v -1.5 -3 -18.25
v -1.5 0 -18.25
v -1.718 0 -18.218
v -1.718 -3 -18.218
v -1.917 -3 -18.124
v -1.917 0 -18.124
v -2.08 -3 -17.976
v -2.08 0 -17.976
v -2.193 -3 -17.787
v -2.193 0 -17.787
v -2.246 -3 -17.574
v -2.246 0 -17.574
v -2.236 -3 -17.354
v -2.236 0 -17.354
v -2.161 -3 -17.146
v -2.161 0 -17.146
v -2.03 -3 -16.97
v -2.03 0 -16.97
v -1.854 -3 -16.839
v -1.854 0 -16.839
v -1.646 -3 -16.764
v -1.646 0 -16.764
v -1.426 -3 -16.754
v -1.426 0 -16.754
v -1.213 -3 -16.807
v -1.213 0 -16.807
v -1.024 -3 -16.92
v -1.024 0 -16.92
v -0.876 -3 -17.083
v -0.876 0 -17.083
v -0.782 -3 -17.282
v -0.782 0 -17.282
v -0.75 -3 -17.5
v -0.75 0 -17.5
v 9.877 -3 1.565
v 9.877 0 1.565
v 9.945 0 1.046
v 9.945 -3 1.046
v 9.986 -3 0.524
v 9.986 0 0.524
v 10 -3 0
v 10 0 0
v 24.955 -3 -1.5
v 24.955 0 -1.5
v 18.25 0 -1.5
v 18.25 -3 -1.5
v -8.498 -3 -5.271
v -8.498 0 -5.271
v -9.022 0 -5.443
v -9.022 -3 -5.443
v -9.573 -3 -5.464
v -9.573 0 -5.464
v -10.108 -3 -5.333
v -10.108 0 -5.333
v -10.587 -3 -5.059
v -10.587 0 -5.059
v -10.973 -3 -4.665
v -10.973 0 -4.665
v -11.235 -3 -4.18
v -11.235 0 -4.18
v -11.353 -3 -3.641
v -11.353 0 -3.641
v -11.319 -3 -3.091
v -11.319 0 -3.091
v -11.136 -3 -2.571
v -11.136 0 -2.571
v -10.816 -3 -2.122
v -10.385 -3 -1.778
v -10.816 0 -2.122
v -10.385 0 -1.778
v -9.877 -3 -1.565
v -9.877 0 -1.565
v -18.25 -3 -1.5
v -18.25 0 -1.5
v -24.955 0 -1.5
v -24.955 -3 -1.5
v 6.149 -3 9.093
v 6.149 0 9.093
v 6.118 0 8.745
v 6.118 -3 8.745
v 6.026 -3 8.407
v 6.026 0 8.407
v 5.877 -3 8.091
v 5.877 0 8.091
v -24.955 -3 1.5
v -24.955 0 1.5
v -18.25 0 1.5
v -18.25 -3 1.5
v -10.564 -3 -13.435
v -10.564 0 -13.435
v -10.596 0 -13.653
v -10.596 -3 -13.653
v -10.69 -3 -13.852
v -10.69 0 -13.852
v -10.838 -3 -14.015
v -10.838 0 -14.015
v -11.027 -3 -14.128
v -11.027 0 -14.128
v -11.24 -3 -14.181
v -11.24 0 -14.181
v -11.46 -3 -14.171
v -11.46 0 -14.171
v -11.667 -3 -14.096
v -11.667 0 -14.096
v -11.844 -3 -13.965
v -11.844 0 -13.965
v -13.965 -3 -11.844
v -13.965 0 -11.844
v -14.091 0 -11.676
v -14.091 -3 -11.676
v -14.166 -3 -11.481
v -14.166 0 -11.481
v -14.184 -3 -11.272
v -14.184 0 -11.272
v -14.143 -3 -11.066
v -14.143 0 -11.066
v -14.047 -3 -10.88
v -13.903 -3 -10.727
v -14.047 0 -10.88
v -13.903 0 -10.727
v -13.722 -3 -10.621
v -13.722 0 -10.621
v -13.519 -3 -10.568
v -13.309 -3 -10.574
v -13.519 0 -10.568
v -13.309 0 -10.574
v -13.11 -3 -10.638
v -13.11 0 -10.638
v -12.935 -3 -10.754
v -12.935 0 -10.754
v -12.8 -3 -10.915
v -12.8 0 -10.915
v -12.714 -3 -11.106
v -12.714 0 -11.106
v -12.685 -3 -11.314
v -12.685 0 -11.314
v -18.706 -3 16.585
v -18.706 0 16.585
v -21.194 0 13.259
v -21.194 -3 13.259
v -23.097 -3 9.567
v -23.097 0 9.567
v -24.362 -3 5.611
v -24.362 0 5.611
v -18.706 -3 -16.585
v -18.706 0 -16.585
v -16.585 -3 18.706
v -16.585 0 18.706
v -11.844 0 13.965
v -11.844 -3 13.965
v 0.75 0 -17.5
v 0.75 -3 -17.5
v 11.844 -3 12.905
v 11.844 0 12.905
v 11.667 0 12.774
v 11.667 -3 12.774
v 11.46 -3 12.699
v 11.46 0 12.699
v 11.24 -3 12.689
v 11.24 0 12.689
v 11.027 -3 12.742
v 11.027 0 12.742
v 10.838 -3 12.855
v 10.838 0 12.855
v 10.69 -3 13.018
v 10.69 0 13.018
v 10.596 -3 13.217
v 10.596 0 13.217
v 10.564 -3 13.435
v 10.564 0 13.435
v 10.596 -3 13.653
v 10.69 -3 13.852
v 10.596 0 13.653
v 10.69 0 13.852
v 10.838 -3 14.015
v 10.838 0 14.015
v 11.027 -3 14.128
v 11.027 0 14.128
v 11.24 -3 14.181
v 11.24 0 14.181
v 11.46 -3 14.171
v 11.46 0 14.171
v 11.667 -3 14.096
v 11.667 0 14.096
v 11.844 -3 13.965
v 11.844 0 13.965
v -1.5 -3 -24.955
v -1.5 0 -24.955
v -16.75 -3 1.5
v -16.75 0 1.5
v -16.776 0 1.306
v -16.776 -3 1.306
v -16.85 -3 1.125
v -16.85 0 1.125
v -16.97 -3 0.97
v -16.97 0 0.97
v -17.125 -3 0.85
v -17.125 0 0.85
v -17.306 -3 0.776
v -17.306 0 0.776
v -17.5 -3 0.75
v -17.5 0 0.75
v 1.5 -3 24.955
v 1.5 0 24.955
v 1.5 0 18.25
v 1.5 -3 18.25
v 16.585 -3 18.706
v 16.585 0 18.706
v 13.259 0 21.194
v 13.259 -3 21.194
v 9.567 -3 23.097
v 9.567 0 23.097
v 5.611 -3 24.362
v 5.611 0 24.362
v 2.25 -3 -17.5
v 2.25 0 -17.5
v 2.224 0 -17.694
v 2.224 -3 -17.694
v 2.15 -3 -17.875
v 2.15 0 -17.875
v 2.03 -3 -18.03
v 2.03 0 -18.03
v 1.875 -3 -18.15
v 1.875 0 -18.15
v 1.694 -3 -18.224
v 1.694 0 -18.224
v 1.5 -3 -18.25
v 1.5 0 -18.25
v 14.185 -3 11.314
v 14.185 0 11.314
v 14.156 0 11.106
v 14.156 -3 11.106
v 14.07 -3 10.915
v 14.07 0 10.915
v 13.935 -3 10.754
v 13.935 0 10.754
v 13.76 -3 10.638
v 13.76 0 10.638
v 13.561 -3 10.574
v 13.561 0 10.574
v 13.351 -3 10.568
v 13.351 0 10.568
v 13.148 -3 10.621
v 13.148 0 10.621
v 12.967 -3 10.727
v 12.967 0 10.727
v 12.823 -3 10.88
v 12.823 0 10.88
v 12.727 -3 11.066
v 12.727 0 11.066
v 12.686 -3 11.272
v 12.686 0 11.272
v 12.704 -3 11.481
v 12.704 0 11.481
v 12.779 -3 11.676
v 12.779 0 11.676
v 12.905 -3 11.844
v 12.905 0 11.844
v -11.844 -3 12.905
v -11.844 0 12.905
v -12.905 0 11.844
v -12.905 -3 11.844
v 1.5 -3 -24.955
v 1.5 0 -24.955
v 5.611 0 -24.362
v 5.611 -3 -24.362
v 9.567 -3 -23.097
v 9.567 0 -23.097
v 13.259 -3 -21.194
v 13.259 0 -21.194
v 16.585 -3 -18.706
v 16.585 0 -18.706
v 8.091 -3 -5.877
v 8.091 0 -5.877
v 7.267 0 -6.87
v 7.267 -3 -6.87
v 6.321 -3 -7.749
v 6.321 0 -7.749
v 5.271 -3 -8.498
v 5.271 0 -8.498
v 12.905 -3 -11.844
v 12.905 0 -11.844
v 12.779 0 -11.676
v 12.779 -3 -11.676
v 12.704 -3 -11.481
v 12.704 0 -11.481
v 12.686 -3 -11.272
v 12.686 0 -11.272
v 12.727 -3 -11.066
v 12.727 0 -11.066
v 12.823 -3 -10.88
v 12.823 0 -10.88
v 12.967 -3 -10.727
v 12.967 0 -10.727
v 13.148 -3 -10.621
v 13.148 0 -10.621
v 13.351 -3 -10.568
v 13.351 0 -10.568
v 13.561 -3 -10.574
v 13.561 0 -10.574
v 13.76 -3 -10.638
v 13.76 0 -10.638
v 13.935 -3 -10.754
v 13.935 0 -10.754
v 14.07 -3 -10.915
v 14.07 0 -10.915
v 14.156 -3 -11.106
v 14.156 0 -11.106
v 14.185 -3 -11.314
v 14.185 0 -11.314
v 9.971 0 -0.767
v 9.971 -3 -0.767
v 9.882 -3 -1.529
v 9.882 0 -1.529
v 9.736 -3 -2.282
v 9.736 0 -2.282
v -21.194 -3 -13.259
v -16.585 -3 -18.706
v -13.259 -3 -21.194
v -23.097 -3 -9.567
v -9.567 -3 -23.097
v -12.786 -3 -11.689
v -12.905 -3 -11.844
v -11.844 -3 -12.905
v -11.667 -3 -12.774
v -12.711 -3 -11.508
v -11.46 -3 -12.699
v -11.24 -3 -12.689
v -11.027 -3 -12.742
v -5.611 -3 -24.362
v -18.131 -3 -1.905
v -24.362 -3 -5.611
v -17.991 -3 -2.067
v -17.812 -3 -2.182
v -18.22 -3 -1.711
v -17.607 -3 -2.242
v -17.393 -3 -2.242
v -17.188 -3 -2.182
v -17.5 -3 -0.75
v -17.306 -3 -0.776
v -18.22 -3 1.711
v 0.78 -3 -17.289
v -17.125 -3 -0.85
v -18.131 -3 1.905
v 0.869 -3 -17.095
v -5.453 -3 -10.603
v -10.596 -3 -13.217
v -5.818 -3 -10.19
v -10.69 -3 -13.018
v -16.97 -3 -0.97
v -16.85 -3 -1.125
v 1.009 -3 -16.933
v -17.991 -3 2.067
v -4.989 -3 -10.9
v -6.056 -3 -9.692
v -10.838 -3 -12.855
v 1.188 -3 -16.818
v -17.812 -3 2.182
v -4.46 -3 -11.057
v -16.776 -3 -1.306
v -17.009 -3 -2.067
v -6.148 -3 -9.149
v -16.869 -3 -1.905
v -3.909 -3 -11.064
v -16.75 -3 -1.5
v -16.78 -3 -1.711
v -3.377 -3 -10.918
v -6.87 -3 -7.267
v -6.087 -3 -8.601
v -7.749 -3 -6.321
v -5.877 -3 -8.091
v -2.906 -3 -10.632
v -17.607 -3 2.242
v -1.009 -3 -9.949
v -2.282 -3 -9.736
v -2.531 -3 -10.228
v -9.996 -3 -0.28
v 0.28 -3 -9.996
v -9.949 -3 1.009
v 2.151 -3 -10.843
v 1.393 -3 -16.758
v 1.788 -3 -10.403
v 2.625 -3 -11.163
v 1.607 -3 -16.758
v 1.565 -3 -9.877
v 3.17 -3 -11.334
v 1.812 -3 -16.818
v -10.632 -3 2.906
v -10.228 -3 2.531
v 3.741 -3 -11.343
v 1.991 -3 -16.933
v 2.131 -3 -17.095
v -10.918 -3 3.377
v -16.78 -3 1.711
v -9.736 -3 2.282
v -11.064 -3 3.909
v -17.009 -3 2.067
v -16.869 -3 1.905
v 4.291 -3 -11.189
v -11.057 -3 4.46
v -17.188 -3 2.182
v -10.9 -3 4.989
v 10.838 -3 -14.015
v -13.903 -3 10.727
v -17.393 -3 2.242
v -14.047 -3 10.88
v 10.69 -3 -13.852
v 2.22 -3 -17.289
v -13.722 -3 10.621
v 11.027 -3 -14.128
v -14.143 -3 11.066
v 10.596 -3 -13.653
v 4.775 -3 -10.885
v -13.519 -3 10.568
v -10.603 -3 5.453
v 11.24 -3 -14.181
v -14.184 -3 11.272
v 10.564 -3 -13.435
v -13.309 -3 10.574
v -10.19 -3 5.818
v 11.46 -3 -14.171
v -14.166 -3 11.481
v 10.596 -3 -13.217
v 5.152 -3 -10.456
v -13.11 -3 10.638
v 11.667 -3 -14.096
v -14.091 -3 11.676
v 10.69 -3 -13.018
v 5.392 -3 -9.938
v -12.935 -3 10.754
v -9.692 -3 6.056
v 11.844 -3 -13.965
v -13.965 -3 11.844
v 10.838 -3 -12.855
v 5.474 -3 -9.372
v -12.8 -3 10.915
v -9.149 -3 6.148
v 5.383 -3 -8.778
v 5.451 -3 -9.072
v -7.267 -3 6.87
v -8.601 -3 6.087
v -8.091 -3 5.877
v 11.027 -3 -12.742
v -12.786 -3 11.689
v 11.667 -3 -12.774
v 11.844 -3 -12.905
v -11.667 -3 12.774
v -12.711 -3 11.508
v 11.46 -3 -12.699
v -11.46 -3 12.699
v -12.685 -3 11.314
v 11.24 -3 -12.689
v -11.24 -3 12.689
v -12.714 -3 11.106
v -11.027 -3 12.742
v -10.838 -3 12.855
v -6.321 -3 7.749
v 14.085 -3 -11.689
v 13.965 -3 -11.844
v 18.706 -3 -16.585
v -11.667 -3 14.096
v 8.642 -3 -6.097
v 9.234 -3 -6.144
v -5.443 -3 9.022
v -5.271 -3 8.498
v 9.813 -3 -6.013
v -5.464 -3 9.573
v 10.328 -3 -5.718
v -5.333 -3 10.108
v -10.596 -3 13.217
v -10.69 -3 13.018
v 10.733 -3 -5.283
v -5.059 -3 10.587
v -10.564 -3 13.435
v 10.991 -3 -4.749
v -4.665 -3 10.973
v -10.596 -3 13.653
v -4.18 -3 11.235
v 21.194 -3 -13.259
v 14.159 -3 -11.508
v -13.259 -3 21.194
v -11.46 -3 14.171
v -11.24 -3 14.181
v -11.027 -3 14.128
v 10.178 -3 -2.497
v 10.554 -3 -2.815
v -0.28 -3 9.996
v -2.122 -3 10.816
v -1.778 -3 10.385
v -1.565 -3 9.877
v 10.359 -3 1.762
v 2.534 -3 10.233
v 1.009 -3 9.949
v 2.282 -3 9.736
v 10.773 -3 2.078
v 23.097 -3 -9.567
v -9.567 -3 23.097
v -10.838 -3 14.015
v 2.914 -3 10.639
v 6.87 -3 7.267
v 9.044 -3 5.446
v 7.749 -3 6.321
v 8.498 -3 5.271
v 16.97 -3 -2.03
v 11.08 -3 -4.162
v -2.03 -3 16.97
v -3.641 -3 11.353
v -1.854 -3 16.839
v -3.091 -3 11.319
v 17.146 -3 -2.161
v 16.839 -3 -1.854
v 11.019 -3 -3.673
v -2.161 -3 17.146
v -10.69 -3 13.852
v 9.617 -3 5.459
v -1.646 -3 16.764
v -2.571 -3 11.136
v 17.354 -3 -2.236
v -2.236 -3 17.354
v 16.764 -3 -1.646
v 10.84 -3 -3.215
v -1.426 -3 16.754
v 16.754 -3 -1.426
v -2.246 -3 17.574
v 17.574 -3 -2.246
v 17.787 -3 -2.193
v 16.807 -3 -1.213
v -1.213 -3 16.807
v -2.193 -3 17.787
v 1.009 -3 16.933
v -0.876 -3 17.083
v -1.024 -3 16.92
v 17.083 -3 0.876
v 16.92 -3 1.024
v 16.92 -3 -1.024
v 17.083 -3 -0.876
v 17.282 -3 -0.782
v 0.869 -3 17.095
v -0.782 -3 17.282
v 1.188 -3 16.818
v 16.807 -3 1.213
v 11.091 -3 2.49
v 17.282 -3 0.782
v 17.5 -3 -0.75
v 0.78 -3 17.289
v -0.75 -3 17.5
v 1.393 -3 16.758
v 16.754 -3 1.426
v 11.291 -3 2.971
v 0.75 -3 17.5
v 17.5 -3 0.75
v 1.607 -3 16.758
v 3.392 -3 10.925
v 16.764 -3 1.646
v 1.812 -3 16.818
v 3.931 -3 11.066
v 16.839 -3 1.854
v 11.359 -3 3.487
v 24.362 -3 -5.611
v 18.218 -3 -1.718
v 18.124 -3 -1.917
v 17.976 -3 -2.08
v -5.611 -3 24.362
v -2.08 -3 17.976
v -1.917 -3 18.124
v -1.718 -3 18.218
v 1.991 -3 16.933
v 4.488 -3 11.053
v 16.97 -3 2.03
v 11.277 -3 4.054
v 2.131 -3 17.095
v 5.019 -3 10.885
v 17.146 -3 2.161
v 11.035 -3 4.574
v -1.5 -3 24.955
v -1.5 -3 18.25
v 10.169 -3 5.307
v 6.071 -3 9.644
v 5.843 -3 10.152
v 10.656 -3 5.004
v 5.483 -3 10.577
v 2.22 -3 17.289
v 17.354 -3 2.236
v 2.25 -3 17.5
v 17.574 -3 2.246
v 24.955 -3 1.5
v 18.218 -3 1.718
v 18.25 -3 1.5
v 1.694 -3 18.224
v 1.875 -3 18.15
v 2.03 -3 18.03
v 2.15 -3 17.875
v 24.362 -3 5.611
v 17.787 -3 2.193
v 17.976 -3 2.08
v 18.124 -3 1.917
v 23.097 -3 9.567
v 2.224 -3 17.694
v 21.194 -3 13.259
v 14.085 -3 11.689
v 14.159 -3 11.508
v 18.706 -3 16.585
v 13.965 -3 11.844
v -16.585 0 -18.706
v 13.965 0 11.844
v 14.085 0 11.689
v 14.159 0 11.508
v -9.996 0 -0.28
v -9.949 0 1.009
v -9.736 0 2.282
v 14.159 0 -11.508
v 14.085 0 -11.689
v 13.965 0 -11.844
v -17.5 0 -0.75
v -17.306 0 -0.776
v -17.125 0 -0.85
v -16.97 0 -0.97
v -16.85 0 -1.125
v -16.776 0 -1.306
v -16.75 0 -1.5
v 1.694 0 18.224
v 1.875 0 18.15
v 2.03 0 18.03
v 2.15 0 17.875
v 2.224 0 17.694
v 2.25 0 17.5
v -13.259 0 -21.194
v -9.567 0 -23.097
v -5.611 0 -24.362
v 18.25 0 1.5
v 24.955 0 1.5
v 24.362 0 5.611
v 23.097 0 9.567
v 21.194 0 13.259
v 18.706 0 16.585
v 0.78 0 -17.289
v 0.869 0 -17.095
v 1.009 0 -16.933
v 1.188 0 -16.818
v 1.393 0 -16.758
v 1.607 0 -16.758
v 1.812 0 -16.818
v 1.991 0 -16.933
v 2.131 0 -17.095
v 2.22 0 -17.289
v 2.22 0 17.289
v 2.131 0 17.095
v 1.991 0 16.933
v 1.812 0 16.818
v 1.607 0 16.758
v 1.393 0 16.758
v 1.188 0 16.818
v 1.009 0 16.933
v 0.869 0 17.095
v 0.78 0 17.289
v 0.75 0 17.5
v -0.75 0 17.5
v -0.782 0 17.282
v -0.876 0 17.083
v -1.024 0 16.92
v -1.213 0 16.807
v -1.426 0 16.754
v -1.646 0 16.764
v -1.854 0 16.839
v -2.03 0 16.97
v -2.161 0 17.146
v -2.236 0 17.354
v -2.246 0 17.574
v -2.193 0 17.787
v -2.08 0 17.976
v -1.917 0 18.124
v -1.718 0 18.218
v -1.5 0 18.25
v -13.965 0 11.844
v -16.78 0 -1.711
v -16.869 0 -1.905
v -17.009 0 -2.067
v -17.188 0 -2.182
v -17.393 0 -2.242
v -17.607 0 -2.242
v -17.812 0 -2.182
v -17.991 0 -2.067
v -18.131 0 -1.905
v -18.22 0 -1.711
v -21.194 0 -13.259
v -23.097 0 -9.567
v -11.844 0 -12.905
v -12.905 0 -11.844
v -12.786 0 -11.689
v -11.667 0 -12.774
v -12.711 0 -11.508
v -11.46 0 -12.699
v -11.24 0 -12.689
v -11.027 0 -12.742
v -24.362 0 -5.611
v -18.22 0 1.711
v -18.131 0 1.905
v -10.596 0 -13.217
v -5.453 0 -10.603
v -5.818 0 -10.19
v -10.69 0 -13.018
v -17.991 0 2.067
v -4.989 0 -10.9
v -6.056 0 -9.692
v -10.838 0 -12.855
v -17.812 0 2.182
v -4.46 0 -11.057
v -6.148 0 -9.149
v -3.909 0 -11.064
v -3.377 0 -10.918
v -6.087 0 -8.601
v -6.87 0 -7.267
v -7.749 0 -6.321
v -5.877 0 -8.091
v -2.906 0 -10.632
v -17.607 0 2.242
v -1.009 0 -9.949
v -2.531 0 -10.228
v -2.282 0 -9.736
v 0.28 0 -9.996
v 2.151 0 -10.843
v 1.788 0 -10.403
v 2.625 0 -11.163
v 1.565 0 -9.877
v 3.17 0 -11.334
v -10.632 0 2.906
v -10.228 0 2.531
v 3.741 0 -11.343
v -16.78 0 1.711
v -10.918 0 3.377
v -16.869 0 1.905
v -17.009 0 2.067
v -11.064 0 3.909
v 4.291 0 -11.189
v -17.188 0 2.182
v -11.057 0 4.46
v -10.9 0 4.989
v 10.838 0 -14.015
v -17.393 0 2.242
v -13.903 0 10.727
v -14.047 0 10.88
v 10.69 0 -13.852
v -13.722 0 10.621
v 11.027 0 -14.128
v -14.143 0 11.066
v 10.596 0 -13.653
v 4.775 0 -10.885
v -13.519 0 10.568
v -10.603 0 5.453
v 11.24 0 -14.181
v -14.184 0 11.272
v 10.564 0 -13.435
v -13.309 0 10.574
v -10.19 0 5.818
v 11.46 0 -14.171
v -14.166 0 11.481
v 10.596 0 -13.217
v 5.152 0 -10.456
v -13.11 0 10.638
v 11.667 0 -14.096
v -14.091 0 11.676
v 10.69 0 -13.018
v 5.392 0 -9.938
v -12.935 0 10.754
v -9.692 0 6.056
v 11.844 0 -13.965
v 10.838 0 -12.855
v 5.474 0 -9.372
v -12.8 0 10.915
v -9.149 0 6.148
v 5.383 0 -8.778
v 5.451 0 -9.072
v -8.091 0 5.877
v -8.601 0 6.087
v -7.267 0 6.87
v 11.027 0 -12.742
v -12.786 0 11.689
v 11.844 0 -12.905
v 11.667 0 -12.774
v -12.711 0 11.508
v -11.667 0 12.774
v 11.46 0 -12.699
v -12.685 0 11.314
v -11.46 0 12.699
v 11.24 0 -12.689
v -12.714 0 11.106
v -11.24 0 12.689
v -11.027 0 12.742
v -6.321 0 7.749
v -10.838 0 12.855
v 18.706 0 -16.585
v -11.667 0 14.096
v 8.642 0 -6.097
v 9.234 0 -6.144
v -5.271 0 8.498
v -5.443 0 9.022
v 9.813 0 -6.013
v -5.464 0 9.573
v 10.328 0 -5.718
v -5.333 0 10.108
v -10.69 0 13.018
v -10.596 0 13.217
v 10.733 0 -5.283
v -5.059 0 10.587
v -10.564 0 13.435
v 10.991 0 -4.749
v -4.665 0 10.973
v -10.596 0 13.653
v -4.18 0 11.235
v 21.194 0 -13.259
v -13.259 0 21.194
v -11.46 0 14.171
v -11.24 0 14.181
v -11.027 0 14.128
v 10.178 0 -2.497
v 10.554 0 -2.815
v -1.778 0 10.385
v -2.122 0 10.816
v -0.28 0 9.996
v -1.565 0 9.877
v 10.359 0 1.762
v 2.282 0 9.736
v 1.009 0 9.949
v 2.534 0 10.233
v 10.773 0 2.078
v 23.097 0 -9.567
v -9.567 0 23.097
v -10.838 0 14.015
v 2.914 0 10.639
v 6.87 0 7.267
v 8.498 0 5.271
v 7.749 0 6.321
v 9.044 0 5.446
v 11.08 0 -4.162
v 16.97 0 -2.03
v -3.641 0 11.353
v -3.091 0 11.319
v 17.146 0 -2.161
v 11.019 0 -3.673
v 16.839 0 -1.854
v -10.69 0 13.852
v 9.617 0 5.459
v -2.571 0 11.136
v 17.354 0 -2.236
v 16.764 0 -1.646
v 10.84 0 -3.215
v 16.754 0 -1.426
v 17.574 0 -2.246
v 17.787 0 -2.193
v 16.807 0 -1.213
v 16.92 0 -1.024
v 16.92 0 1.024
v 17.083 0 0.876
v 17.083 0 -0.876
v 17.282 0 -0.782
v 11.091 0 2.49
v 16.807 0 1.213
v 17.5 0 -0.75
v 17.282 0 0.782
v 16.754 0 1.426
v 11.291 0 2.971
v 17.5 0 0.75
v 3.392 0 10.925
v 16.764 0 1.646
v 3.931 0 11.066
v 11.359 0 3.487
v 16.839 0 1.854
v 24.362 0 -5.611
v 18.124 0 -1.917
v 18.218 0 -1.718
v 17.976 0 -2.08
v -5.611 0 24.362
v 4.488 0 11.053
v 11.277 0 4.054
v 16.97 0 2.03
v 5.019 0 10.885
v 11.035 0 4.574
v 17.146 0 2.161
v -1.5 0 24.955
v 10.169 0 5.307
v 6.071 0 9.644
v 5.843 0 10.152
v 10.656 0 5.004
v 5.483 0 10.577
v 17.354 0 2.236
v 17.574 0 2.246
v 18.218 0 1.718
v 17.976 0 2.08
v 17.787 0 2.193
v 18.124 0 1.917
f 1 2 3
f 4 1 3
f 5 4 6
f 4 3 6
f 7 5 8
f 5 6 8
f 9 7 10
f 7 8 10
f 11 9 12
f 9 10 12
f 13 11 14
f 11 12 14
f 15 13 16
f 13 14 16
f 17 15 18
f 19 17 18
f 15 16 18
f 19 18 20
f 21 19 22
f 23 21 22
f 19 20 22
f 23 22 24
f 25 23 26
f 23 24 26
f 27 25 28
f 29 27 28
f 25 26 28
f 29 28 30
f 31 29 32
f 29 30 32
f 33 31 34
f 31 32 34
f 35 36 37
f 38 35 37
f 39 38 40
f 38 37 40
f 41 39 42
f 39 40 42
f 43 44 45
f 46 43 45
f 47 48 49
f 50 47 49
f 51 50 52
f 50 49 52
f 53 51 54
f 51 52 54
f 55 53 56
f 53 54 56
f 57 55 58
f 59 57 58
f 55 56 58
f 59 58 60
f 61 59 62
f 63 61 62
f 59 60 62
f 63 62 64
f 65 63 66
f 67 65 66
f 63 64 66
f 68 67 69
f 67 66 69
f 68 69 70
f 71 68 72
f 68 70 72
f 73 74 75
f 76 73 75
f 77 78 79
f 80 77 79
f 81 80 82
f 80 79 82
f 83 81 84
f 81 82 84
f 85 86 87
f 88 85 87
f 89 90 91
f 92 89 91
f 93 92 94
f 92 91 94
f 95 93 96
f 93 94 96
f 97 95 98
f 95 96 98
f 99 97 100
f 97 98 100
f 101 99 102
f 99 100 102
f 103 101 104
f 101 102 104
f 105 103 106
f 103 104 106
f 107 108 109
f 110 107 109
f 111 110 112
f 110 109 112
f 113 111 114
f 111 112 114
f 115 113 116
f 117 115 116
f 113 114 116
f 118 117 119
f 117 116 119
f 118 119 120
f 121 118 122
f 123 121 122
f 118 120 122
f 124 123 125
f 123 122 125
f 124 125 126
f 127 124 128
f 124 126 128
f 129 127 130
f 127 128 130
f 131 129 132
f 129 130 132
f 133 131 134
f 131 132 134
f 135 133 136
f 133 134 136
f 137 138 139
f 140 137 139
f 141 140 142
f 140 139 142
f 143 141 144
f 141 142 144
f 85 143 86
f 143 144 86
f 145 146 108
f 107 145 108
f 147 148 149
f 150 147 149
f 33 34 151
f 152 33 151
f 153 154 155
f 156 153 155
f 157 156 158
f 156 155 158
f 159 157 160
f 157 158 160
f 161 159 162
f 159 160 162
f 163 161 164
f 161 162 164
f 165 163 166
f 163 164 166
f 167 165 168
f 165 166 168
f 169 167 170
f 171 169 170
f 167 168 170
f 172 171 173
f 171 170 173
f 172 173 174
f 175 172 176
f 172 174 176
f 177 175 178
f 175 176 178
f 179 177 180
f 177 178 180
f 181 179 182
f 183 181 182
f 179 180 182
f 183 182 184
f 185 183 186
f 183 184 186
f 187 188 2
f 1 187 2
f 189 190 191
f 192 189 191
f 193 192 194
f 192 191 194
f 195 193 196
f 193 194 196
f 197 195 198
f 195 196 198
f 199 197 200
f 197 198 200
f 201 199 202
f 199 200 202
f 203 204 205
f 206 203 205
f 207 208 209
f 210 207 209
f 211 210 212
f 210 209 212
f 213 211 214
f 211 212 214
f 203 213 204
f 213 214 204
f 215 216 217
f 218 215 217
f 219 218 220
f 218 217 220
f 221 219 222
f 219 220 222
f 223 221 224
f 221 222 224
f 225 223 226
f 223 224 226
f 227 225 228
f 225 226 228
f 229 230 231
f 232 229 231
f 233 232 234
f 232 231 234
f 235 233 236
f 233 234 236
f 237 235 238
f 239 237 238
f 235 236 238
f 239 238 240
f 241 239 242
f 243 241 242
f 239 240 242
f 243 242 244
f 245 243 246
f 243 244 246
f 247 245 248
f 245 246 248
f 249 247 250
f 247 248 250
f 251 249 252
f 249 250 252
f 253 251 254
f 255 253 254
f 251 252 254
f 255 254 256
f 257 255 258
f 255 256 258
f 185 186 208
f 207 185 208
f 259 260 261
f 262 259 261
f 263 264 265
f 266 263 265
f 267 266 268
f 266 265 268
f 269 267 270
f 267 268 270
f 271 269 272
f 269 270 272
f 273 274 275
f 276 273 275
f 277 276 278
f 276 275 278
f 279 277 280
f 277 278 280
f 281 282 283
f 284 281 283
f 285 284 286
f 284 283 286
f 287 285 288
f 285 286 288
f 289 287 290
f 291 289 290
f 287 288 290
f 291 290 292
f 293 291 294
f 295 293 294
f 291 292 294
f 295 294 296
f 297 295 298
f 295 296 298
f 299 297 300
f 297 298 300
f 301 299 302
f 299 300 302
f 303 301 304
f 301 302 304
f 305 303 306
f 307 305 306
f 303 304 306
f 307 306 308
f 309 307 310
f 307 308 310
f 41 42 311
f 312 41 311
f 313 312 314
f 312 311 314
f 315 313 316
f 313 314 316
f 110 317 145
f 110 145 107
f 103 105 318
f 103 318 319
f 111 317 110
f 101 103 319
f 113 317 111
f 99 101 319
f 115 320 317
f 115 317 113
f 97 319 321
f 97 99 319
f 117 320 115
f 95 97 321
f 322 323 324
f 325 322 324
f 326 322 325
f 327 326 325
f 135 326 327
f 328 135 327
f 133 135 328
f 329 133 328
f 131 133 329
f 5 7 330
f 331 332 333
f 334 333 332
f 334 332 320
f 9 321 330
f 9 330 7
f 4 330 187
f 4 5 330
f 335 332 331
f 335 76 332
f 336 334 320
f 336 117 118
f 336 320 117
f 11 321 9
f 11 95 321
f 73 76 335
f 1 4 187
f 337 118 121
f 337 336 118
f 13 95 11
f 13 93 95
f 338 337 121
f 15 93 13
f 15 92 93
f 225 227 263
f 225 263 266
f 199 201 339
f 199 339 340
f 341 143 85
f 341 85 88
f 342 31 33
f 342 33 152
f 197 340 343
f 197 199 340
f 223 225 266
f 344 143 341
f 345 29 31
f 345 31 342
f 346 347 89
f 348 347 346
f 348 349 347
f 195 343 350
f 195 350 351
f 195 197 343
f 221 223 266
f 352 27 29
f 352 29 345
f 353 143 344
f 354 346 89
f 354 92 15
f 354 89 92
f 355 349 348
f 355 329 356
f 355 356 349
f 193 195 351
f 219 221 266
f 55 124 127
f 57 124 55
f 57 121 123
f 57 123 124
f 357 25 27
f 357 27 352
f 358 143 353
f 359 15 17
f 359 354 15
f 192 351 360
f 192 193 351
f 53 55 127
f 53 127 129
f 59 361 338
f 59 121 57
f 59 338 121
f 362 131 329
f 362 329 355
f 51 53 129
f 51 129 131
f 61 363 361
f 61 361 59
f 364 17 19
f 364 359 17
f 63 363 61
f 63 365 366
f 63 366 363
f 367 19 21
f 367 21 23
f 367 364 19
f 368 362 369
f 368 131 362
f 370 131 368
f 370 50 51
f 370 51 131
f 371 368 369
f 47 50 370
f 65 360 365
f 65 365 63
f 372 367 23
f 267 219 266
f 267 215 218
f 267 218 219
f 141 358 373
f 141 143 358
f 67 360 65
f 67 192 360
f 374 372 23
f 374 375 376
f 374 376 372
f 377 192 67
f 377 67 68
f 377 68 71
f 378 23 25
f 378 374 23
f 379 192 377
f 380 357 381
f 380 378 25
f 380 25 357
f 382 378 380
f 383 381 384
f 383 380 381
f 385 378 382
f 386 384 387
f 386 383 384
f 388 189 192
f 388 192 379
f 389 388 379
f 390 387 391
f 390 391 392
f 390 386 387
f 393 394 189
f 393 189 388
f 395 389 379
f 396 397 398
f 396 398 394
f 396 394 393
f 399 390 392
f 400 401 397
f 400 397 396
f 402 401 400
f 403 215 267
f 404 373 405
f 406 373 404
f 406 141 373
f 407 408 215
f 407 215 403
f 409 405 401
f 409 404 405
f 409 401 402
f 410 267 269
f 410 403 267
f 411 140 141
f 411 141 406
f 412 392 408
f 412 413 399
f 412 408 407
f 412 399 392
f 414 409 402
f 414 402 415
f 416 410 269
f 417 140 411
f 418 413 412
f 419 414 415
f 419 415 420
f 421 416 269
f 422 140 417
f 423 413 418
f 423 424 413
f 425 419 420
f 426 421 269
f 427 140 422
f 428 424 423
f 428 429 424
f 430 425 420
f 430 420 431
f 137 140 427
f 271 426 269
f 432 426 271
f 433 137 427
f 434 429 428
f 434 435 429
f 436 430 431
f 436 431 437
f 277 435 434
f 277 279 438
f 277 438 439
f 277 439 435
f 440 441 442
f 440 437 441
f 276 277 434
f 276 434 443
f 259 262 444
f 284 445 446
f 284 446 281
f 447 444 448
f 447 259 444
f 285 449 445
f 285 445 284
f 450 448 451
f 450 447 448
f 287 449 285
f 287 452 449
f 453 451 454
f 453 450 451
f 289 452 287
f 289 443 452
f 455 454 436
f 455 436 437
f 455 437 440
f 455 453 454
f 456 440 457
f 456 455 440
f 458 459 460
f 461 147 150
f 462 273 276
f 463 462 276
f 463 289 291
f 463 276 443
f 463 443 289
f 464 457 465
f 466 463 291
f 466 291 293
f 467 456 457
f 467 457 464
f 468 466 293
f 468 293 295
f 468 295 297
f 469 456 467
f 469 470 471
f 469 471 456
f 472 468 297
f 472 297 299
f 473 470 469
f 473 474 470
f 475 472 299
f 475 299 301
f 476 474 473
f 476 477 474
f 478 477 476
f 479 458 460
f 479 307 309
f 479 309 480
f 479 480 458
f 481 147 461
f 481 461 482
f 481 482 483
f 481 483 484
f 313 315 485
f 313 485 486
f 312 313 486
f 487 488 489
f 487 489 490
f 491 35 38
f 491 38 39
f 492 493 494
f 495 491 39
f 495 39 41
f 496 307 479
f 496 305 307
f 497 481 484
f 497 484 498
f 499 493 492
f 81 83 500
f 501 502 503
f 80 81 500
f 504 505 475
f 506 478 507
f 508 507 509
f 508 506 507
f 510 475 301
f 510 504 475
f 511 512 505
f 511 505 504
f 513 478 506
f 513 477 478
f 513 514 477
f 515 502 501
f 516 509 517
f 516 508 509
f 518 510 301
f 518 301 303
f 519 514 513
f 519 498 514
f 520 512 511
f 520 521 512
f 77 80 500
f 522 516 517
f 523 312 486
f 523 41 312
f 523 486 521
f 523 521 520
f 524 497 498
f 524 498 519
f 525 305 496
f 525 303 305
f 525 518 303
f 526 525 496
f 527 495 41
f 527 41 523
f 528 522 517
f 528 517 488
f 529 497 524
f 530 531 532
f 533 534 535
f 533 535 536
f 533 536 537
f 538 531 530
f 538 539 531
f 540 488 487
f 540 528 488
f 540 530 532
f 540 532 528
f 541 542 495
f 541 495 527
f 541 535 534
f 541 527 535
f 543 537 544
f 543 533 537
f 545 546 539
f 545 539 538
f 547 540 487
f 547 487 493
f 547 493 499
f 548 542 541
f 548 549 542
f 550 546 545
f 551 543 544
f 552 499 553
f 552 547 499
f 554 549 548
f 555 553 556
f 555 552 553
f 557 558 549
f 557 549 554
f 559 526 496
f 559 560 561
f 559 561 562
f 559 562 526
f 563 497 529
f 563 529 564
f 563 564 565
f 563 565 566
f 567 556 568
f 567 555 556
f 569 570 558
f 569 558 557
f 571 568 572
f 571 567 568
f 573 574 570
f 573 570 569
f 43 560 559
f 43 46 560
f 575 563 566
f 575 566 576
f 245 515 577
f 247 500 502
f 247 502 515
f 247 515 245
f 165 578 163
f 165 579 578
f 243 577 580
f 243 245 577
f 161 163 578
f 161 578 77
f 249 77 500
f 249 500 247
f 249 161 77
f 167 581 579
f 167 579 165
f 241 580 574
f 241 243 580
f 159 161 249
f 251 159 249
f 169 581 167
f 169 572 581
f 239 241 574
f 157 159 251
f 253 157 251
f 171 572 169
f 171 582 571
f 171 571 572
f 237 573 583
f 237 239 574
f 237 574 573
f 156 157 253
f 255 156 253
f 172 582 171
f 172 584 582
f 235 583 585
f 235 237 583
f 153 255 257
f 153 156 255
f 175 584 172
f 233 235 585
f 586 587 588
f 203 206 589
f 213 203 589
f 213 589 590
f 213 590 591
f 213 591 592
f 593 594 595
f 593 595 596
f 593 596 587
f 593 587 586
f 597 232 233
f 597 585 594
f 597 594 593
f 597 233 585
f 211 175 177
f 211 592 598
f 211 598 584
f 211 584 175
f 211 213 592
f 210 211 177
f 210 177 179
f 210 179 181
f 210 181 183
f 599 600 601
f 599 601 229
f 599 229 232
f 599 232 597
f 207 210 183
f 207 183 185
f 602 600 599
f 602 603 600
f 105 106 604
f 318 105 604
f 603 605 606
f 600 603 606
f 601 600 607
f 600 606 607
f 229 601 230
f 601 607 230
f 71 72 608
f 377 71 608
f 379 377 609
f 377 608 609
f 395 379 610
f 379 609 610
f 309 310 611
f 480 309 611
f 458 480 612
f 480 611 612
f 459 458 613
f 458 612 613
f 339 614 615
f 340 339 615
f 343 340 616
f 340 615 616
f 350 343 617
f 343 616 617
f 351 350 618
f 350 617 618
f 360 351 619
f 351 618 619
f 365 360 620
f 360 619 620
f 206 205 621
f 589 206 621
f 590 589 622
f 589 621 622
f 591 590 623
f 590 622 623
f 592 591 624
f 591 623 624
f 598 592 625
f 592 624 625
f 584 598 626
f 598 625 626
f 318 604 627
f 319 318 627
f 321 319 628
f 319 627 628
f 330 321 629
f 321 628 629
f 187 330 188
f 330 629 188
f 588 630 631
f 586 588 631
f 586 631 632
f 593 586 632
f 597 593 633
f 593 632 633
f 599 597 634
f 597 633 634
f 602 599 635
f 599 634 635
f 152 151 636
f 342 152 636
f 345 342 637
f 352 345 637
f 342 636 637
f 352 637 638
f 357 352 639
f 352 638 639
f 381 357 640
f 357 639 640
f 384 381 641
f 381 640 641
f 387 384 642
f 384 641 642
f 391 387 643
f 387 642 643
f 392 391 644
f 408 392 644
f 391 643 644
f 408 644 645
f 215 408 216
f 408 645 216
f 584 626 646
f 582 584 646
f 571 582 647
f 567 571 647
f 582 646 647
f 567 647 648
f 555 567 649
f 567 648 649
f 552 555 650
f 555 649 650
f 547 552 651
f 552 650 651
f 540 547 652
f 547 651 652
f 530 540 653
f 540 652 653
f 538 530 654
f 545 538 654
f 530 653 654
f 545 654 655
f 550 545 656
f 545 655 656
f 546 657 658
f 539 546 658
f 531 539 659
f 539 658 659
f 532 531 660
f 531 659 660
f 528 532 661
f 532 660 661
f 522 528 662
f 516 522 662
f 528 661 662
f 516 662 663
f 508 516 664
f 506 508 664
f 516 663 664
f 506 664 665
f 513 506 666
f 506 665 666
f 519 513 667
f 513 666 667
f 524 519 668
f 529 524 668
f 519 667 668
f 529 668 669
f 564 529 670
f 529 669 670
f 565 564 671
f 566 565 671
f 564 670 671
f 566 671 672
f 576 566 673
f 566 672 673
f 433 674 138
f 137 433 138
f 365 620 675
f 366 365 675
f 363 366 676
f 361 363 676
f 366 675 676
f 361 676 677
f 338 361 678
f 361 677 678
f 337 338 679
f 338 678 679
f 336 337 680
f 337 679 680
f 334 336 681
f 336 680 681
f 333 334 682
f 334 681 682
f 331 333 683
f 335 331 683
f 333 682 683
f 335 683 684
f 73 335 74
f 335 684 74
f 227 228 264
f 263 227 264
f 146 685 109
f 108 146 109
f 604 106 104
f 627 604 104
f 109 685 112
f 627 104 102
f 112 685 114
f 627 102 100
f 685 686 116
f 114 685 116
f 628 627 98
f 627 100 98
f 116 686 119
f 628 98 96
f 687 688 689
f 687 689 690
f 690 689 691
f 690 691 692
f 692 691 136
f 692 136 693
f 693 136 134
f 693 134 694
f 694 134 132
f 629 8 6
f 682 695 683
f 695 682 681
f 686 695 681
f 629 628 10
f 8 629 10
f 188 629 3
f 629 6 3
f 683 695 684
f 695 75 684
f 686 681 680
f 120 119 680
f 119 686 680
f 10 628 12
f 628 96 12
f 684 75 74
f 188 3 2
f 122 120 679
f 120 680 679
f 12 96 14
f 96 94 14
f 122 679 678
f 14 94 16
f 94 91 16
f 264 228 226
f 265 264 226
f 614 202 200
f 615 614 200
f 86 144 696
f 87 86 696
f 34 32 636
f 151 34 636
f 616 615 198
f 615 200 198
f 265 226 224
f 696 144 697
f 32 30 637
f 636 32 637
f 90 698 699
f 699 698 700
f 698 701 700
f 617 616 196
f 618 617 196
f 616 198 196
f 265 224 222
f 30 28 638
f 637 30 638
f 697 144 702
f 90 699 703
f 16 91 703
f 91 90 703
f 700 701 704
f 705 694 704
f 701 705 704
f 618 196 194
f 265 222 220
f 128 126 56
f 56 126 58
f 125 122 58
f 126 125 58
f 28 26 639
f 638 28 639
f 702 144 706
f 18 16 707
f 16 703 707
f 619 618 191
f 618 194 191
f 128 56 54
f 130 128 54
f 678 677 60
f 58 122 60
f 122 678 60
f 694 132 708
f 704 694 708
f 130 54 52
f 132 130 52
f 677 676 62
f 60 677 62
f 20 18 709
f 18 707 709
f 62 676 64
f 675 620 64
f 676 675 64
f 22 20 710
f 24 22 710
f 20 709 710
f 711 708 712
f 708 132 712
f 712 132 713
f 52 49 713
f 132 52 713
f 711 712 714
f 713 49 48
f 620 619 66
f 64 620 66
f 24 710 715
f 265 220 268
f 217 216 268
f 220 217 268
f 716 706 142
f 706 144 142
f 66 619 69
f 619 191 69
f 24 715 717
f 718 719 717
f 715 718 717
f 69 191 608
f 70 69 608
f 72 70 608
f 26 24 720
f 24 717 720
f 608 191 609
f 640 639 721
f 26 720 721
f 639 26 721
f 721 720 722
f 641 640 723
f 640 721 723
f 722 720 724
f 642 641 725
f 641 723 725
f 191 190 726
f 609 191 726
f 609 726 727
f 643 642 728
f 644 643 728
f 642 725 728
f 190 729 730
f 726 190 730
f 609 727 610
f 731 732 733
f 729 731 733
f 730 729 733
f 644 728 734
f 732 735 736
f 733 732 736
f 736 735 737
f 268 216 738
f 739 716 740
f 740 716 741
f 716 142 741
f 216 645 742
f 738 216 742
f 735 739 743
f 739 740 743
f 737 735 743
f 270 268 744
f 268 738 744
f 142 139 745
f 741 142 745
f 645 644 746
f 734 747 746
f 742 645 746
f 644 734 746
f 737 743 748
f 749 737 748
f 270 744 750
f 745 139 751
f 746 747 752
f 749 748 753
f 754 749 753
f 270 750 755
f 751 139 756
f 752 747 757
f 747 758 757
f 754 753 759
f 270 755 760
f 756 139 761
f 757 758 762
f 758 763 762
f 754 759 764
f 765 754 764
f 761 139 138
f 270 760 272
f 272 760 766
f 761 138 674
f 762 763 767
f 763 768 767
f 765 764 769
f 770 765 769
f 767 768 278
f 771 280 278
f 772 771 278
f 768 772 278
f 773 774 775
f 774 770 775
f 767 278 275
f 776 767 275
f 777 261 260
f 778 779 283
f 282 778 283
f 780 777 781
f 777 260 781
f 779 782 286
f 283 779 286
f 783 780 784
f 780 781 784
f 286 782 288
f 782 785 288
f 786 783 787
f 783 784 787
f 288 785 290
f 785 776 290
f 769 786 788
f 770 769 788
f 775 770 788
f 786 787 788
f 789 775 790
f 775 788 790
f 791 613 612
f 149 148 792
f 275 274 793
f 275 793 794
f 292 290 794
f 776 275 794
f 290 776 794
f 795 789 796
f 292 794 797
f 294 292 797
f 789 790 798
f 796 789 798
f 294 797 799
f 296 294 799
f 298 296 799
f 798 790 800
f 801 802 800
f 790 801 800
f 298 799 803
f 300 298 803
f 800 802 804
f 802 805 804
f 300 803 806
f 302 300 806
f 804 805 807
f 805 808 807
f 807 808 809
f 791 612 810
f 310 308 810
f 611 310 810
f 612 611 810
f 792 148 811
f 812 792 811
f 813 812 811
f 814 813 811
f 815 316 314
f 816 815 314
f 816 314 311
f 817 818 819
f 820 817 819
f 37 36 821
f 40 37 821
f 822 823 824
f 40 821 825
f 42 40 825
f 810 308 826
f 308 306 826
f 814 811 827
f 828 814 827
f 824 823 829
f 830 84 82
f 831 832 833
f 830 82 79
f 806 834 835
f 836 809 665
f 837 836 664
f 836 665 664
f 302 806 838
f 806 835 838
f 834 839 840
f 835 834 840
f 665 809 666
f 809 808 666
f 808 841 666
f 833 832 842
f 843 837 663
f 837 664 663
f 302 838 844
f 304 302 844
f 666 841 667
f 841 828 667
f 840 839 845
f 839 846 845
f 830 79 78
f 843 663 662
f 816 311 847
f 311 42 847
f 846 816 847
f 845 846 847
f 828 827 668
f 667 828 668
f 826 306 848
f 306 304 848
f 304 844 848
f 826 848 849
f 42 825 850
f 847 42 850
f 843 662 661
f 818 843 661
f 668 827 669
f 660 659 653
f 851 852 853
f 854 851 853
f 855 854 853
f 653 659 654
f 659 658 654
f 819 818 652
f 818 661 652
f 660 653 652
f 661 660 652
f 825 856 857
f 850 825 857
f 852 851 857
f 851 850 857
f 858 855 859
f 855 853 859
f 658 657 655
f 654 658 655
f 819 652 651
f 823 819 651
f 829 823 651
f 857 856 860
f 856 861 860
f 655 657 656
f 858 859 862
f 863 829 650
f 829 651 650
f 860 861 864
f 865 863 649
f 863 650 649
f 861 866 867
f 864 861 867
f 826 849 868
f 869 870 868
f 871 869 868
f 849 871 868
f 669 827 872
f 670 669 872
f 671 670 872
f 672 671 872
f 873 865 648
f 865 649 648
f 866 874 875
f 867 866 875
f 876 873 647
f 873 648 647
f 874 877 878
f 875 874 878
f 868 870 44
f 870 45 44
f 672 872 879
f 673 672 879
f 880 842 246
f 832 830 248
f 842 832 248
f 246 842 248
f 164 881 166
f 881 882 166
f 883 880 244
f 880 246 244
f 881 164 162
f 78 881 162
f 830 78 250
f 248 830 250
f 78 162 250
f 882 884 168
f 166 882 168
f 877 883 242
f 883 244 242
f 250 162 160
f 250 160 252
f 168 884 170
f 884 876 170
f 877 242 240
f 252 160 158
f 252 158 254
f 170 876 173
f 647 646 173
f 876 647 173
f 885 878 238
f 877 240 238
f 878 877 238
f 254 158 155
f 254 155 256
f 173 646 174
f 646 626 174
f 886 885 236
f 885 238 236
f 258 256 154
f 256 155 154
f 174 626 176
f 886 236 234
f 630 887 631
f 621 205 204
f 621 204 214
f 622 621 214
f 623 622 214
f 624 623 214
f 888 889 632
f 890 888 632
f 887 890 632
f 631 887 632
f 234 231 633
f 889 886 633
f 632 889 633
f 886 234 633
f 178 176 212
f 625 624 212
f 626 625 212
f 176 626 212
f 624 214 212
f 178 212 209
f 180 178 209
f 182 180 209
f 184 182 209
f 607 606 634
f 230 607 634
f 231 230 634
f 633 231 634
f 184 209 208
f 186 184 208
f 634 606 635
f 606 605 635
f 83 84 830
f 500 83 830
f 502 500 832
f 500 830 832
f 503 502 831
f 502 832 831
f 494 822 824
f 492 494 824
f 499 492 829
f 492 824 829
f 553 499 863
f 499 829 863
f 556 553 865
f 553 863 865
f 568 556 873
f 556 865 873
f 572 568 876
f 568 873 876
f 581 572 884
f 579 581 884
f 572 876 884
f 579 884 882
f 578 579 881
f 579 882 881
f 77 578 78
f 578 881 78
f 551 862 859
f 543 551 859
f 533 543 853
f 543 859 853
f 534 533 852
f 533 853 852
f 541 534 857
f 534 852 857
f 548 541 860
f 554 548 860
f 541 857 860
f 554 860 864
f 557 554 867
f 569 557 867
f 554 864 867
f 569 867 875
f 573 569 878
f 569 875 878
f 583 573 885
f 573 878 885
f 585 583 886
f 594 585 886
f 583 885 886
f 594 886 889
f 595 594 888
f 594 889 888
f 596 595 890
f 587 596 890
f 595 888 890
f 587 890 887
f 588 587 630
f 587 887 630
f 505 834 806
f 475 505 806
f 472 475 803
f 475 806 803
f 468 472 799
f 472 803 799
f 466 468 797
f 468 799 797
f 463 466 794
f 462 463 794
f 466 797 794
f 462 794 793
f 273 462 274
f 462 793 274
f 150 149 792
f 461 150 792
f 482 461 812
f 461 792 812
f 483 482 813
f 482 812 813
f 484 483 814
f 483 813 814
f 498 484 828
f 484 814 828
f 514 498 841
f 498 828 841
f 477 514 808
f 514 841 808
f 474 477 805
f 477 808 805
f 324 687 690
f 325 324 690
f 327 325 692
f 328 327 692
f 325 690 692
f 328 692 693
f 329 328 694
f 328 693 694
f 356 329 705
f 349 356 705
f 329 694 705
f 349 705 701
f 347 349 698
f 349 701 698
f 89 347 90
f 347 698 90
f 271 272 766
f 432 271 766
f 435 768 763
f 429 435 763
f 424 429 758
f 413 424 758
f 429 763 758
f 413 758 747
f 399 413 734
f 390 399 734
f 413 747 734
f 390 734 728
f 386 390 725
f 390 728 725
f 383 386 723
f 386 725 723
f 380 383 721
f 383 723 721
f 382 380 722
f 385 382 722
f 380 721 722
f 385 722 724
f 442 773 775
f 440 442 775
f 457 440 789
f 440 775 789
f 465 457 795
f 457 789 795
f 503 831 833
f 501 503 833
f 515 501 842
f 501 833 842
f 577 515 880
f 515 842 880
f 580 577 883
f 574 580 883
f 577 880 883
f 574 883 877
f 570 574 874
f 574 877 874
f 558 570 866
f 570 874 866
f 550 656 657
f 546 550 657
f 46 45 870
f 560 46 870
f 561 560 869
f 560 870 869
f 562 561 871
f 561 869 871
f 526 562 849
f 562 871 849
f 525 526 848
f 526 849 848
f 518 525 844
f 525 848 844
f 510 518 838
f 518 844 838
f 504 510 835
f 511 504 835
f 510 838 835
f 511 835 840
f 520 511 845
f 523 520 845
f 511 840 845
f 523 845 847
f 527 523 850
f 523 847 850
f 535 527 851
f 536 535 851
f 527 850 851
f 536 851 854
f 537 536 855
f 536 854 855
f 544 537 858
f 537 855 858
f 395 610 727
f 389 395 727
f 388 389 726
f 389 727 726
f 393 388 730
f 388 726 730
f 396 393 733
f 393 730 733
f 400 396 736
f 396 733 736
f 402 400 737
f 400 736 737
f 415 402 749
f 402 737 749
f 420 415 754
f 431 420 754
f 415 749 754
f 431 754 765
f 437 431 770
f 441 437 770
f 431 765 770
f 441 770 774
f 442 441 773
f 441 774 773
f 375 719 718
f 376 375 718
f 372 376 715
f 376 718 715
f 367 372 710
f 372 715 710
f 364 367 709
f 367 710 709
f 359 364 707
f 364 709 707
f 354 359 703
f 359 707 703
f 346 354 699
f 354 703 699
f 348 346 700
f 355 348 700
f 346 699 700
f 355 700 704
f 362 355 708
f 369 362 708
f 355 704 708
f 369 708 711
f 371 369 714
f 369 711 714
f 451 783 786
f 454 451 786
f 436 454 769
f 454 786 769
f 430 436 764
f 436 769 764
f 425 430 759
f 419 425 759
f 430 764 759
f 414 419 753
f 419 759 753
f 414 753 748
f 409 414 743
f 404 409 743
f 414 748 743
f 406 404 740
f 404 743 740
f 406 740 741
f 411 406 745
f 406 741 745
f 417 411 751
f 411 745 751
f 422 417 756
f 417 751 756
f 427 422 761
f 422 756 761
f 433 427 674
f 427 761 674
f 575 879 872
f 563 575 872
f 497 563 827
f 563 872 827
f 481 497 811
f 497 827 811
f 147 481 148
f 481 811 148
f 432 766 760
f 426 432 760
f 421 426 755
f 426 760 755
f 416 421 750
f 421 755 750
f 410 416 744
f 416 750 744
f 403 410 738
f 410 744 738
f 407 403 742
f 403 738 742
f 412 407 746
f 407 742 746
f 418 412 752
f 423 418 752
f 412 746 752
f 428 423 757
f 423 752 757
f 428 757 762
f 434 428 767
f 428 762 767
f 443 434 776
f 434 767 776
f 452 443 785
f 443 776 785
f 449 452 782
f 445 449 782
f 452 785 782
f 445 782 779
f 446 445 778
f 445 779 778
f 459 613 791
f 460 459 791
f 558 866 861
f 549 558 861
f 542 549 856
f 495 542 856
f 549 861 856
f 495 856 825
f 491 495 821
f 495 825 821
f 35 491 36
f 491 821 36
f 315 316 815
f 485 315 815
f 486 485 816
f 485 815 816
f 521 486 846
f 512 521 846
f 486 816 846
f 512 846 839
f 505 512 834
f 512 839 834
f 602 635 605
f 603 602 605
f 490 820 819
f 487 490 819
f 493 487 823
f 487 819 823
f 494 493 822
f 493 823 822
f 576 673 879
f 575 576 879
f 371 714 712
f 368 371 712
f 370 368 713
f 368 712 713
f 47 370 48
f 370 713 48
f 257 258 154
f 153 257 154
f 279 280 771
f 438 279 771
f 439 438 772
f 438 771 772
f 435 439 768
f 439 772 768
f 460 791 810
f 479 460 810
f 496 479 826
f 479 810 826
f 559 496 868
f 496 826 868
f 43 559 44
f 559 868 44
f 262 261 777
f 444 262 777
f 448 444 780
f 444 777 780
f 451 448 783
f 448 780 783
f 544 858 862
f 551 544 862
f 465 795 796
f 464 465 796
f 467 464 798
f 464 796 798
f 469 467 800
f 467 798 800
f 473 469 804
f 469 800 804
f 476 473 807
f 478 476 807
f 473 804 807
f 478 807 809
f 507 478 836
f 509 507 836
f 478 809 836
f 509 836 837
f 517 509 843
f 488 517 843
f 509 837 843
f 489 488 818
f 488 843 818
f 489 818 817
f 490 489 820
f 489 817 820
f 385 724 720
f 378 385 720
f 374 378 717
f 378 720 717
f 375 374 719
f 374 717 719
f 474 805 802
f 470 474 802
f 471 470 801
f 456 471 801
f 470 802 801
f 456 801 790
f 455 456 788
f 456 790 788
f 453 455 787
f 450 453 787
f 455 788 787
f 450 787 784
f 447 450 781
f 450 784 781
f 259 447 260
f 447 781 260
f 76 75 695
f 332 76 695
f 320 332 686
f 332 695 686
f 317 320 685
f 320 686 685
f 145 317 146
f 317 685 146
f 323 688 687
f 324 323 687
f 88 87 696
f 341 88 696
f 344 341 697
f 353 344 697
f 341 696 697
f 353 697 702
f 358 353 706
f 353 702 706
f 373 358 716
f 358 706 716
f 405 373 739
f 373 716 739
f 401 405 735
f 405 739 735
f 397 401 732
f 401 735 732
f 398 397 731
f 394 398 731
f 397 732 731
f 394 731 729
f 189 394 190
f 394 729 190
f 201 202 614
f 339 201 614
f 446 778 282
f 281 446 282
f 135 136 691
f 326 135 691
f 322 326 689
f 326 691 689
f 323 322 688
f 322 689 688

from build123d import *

# Parameters (mm, degrees)
F2_DEPTH = 3


with BuildPart() as f2:
    # F1 (on Front) → F2 (new body)
    with BuildSketch(Plane.XZ):
        with BuildLine():
            Line((18.25, 1.5), (24.9549594269, 1.5))
            ThreePointArc((24.9549594269, 1.5), (23.0969883128, 9.5670858091), (18.7064812068, 16.5851608632))
            Line((18.7064812068, 16.5851608632), (13.9653589284, 11.8440385849))
            ThreePointArc((13.9653589284, 11.8440385849), (14.1279384919, 11.6007210733), (14.1850288425, 11.313708499))
            ThreePointArc((14.1850288425, 11.313708499), (13.1480162683, 10.6207988496), (12.9046987567, 11.8440385849))
            Line((12.9046987567, 11.8440385849), (11.8440385849, 12.9046987567))
            ThreePointArc((11.8440385849, 12.9046987567), (10.563708499, 13.4350288425), (11.8440385849, 13.9653589284))
            Line((11.8440385849, 13.9653589284), (16.5851608632, 18.7064812068))
            ThreePointArc((16.5851608632, 18.7064812068), (9.5670858091, 23.0969883128), (1.5, 24.9549594269))
            Line((1.5, 24.9549594269), (1.5, 18.25))
            ThreePointArc((1.5, 18.25), (2.0303300859, 18.0303300859), (2.25, 17.5))
            ThreePointArc((2.25, 17.5), (1.5, 16.75), (0.75, 17.5))
            Line((0.75, 17.5), (-0.75, 17.5))
            ThreePointArc((-0.75, 17.5), (-2.0303300859, 16.9696699141), (-1.5, 18.25))
            Line((-1.5, 18.25), (-1.5, 24.9549594269))
            ThreePointArc((-1.5, 24.9549594269), (-9.5670858091, 23.0969883128), (-16.5851608632, 18.7064812068))
            Line((-16.5851608632, 18.7064812068), (-11.8440385849, 13.9653589284))
            ThreePointArc((-11.8440385849, 13.9653589284), (-11.0266959247, 14.1279384919), (-10.563708499, 13.4350288425))
            ThreePointArc((-10.563708499, 13.4350288425), (-11.0266959247, 12.7421191932), (-11.8440385849, 12.9046987567))
            Line((-11.8440385849, 12.9046987567), (-12.9046987567, 11.8440385849))
            ThreePointArc((-12.9046987567, 11.8440385849), (-12.7421191932, 11.6007210733), (-12.6850288425, 11.313708499))
            ThreePointArc((-12.6850288425, 11.313708499), (-13.7220414168, 10.6207988496), (-13.9653589284, 11.8440385849))
            Line((-13.9653589284, 11.8440385849), (-18.7064812068, 16.5851608632))
            ThreePointArc((-18.7064812068, 16.5851608632), (-23.0969883128, 9.5670858091), (-24.9549594269, 1.5))
            Line((-24.9549594269, 1.5), (-18.25, 1.5))
            ThreePointArc((-18.25, 1.5), (-17.5, 2.25), (-16.75, 1.5))
            ThreePointArc((-16.75, 1.5), (-16.9696699141, 0.9696699141), (-17.5, 0.75))
            Line((-17.5, 0.75), (-17.5, -0.75))
            ThreePointArc((-17.5, -0.75), (-16.9696699141, -0.9696699141), (-16.75, -1.5))
            ThreePointArc((-16.75, -1.5), (-17.5, -2.25), (-18.25, -1.5))
            Line((-18.25, -1.5), (-24.9549594269, -1.5))
            ThreePointArc((-24.9549594269, -1.5), (-23.0969883128, -9.5670858091), (-18.7064812068, -16.5851608632))
            Line((-18.7064812068, -16.5851608632), (-13.9653589284, -11.8440385849))
            ThreePointArc((-13.9653589284, -11.8440385849), (-13.7220414168, -10.6207988496), (-12.6850288425, -11.313708499))
            ThreePointArc((-12.6850288425, -11.313708499), (-12.7421191932, -11.6007210733), (-12.9046987567, -11.8440385849))
            Line((-12.9046987567, -11.8440385849), (-11.8440385849, -12.9046987567))
            ThreePointArc((-11.8440385849, -12.9046987567), (-11.0266959247, -12.7421191932), (-10.563708499, -13.4350288425))
            ThreePointArc((-10.563708499, -13.4350288425), (-11.0266959247, -14.1279384919), (-11.8440385849, -13.9653589284))
            Line((-11.8440385849, -13.9653589284), (-16.5851608632, -18.7064812068))
            ThreePointArc((-16.5851608632, -18.7064812068), (-9.5670858091, -23.0969883128), (-1.5, -24.9549594269))
            Line((-1.5, -24.9549594269), (-1.5, -18.25))
            ThreePointArc((-1.5, -18.25), (-2.0303300859, -16.9696699141), (-0.75, -17.5))
            Line((-0.75, -17.5), (0.75, -17.5))
            ThreePointArc((0.75, -17.5), (1.5, -16.75), (2.25, -17.5))
            ThreePointArc((2.25, -17.5), (2.0303300859, -18.0303300859), (1.5, -18.25))
            Line((1.5, -18.25), (1.5, -24.9549594269))
            ThreePointArc((1.5, -24.9549594269), (9.5670858091, -23.0969883128), (16.5851608632, -18.7064812068))
            Line((16.5851608632, -18.7064812068), (11.8440385849, -13.9653589284))
            ThreePointArc((11.8440385849, -13.9653589284), (10.563708499, -13.4350288425), (11.8440385849, -12.9046987567))
            Line((11.8440385849, -12.9046987567), (12.9046987567, -11.8440385849))
            ThreePointArc((12.9046987567, -11.8440385849), (13.1480162683, -10.6207988496), (14.1850288425, -11.313708499))
            ThreePointArc((14.1850288425, -11.313708499), (14.1279384919, -11.6007210733), (13.9653589284, -11.8440385849))
            Line((13.9653589284, -11.8440385849), (18.7064812068, -16.5851608632))
            ThreePointArc((18.7064812068, -16.5851608632), (23.0969883128, -9.5670858091), (24.9549594269, -1.5))
            Line((24.9549594269, -1.5), (18.25, -1.5))
            ThreePointArc((18.25, -1.5), (16.9696699141, -2.0303300859), (17.5, -0.75))
            Line((17.5, -0.75), (17.5, 0.75))
            ThreePointArc((17.5, 0.75), (16.9696699141, 2.0303300859), (18.25, 1.5))
        make_face()
        with BuildLine():
            ThreePointArc((9.8767656083, 1.5650882145), (9.9691437968, 0.7849662149), (10, 0))
            ThreePointArc((10, 0), (9.9338326925, -1.1484633378), (9.7362063924, -2.2817285302))
            ThreePointArc((9.7362063924, -2.2817285302), (10.7093913456, -3.0062809605), (11.0798284208, -4.1616343917))
            ThreePointArc((11.0798284208, -4.1616343917), (10.081943125, -5.884910827), (8.0906124274, -5.8772434482))
            ThreePointArc((8.0906124274, -5.8772434482), (6.8081540818, -7.3245503615), (5.2711118466, -8.4979632796))
            ThreePointArc((5.2711118466, -8.4979632796), (5.4225096089, -8.9235676616), (5.4738602751, -9.3723699359))
            ThreePointArc((5.4738602751, -9.3723699359), (3.7412190824, -11.3429608382), (1.5650882145, -9.8767656083))
            ThreePointArc((1.5650882145, -9.8767656083), (-0.3651473111, -9.9933311484), (-2.2817285302, -9.7362063924))
            ThreePointArc((-2.2817285302, -9.7362063924), (-4.9885220711, -10.8995936469), (-5.8772434482, -8.0906124274))
            ThreePointArc((-5.8772434482, -8.0906124274), (-7.3245503615, -6.8081540818), (-8.4979632796, -5.2711118466))
            ThreePointArc((-8.4979632796, -5.2711118466), (-11.2345943645, -4.1797587953), (-9.8767656083, -1.5650882145))
            ThreePointArc((-9.8767656083, -1.5650882145), (-9.9933311484, 0.3651473111), (-9.7362063924, 2.2817285302))
            ThreePointArc((-9.7362063924, 2.2817285302), (-10.8995936469, 4.9885220711), (-8.0906124274, 5.8772434482))
            ThreePointArc((-8.0906124274, 5.8772434482), (-6.8081540818, 7.3245503615), (-5.2711118466, 8.4979632796))
            ThreePointArc((-5.2711118466, 8.4979632796), (-4.1797587953, 11.2345943645), (-1.5650882145, 9.8767656083))
            ThreePointArc((-1.5650882145, 9.8767656083), (0.3651473111, 9.9933311484), (2.2817285302, 9.7362063924))
            ThreePointArc((2.2817285302, 9.7362063924), (4.487709352, 11.0528897352), (6.1485645292, 9.0928982833))
            ThreePointArc((6.1485645292, 9.0928982833), (6.0795351595, 8.5737181445), (5.8772434482, 8.0906124274))
            ThreePointArc((5.8772434482, 8.0906124274), (7.3245503615, 6.8081540818), (8.4979632796, 5.2711118466))
            ThreePointArc((8.4979632796, 5.2711118466), (10.423680174, 5.1729426389), (11.3593000735, 3.4869301375))
            ThreePointArc((11.3593000735, 3.4869301375), (10.9455975631, 2.2733213849), (9.8767656083, 1.5650882145))
        make_face(mode=Mode.SUBTRACT)
    extrude(amount=F2_DEPTH)


solid = f2.part
